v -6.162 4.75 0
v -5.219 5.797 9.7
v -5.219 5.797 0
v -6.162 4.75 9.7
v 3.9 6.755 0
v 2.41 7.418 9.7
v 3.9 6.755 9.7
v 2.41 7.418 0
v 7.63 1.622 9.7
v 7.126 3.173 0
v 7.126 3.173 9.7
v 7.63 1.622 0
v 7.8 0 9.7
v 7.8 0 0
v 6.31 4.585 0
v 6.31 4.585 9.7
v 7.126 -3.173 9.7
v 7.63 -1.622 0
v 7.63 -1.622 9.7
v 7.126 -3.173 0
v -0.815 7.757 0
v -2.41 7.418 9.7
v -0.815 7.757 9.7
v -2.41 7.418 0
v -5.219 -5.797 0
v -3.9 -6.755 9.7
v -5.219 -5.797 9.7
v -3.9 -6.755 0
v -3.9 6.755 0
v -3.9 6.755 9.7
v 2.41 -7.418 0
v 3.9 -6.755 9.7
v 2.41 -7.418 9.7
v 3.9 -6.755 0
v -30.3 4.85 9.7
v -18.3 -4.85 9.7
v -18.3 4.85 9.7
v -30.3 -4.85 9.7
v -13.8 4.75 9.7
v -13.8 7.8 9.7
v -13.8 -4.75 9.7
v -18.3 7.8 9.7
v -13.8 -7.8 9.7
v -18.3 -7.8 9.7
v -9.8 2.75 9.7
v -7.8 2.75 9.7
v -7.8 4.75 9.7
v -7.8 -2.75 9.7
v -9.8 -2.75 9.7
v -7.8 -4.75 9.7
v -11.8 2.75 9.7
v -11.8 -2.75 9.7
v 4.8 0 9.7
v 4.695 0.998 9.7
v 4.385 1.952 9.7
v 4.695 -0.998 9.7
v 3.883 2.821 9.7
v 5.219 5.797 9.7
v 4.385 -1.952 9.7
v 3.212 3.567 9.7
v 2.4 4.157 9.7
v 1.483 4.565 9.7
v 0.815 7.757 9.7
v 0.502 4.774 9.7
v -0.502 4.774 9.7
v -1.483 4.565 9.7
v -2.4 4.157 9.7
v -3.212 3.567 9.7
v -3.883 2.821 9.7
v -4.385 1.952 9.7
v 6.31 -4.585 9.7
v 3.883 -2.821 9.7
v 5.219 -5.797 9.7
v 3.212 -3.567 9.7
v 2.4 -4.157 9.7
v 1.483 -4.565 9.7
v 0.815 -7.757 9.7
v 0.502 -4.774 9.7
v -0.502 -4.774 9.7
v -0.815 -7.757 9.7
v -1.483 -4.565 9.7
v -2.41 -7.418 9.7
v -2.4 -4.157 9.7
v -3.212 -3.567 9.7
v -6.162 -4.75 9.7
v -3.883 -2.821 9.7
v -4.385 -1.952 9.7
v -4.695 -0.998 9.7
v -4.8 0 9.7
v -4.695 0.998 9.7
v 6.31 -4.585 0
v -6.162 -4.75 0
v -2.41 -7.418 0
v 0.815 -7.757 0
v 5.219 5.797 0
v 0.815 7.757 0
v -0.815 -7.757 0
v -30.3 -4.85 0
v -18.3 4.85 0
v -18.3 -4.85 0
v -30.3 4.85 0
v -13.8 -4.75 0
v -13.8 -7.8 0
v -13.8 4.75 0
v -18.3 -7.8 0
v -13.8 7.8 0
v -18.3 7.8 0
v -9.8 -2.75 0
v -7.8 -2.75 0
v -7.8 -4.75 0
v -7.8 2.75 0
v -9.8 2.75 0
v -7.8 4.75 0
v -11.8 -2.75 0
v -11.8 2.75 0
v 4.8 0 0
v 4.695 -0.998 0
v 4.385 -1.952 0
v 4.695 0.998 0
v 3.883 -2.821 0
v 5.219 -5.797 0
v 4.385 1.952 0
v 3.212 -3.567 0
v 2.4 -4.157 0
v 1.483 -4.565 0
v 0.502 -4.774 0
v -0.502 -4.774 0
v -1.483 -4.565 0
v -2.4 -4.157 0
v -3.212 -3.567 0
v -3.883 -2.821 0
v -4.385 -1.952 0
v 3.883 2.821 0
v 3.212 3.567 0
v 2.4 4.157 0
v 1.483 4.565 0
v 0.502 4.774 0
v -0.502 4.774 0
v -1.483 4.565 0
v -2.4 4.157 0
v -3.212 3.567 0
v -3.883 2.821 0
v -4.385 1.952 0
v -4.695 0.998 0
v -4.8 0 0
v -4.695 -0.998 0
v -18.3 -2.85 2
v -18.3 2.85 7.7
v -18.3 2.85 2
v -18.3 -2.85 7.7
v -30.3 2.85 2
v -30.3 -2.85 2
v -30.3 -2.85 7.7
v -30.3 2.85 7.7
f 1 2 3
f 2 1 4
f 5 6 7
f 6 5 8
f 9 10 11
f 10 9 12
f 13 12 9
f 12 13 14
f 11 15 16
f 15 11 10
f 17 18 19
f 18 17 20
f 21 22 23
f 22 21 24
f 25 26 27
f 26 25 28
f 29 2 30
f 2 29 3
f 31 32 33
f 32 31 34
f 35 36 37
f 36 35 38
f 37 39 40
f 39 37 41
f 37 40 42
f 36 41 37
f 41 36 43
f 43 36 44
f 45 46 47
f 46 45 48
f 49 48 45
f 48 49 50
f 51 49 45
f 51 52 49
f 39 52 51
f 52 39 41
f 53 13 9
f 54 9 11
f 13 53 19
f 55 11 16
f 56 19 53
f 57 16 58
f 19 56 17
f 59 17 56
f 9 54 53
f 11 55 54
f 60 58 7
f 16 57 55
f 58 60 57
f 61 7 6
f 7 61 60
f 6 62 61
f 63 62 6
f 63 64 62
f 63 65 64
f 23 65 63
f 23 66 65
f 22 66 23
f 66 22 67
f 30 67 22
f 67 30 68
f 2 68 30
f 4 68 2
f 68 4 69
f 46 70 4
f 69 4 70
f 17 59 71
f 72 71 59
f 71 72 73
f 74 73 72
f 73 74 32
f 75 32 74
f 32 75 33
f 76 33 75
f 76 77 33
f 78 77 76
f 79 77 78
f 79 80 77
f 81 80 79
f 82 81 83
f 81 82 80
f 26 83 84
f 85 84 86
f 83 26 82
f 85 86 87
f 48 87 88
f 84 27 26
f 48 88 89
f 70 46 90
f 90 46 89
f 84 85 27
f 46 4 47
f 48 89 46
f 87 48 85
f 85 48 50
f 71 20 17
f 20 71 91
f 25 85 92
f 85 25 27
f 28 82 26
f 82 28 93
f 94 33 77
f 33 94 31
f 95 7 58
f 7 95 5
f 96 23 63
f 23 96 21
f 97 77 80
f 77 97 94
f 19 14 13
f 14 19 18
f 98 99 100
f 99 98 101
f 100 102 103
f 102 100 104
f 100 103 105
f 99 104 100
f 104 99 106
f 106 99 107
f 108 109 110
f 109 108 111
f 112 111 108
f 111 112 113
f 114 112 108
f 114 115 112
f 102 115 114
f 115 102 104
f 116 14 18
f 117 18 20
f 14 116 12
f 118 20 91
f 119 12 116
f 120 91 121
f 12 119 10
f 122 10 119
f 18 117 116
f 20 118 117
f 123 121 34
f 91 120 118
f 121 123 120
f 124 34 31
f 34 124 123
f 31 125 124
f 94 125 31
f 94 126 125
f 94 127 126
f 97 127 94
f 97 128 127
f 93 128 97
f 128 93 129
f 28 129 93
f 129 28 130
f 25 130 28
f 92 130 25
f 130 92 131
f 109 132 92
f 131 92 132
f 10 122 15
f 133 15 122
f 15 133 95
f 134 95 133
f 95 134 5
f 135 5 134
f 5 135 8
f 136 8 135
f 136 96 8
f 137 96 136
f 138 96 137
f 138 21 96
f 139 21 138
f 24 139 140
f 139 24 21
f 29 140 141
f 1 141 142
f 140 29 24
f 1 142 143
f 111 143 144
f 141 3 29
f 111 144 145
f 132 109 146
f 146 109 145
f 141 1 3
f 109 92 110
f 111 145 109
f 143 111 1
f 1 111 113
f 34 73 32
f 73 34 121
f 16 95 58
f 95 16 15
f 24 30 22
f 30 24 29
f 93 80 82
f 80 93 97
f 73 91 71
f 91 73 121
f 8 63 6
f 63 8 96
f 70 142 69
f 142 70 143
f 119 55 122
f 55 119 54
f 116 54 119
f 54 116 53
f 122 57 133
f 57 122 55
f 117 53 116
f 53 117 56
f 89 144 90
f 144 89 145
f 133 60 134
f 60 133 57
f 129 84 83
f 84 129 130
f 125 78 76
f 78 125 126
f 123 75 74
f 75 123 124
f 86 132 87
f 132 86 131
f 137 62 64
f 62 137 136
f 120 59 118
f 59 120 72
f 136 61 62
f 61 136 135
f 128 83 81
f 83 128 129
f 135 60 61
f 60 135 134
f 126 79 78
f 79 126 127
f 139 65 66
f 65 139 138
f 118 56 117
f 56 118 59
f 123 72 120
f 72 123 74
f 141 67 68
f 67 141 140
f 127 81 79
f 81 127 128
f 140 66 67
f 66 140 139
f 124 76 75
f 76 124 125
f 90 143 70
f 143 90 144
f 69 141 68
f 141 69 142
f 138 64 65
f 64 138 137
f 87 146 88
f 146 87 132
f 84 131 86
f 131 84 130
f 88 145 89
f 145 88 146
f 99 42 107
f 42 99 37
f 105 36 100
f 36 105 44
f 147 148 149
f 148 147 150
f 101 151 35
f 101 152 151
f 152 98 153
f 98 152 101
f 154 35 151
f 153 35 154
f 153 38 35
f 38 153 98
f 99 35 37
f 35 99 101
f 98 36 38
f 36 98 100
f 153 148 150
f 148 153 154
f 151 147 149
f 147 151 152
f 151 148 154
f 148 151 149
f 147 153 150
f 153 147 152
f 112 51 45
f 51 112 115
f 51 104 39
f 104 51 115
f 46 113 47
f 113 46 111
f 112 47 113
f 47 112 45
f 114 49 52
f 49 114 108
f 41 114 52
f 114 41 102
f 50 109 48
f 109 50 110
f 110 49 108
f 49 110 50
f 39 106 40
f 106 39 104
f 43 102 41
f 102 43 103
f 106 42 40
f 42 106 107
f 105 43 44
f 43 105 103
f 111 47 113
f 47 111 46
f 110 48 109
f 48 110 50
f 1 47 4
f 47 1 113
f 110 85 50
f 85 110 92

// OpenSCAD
// -----------------------------------------------------------
// Customizable Socket Organizers: Dowel (Round Cross Section)
// -----------------------------------------------------------
//
// Zemba Craftworks
// youtube.com/zembacraftworks
// thingiverse.com/zembacraftworks/about

// This is a configurable, 3D printable insert designed to
// slide onto a metal or wooden bar to create socket set
// organizers. Dimensions can be adjusted for sockets of
// all sizes and to slide onto bars/holders of any size.

// Date Created:  2018-07-30
// Last Modified: 2018-12-19

// Critical Dimensions
// -------------------
// Adjust these dimensions and verify them with a test print
// before printing holders for all of your sockets! You want a
// snug fit but not so tight that anything gets stuck. These
// values will vary depending on your sockets, the rail you're
// using, and the calibration of your printer.

d  = 9.7;           // Socket Drive Width (mm)
                    // (9.7 = approximately 3/8 in * 25.4 mm/in)
                    
dh = 12;            // Socket Drive Height (mm)
                    // May or may not be limited by the design
                    // of your sockets
                    
rr = 4.8;             // Dowel Radius (mm)
                    // (4.8 = approximately 3/8 in * 25.4 mm/in / 2)

fn1 = 30;           // Number of Facets for Nub Curvature 


// Other Dimensions 
// ----------------
// These dimensions are not as critical to the fit, but can be
// adjusted to suit your preferences.

dw = 2;             // Drive Wall Thickness (mm)
                    // Set to d/2 to make the drive post solid
ds = 5.5;           // Drive Stand Width (mm)
                    // (region between clamp and flange)
ct = 3;             // Wall Thickness of Rail Clamp (mm)
ch = d;             // Height of Rail Clamp (mm)
                    // (generally ch = d)                  
cg = 0;             // Bottom Gap of Rail Clamp (mm)
                    // (adds some flex when attaching to rail)
fa = 6;             // Flange Height above Rail Clamp (mm)
fc = 2;             // Flange Chamfer Width (mm)
fw = 2*rr+2*ct;     // Flange Width (mm)
                    // (fw = ry+2*ct = flush with clamp)
ft = 1.5*ct;        // Flange Thickness (mm)

// Nub Dimensions (Optional)
// ------------------
// This imitates the spring-loaded bearing on the socket wrench which
// mates to the internal notch or side hole of the socket. However,
// you may have better success without it. Depending on your print
// it may snap off or deform easily when inserting into the socket.

enableNub = false;  // Enable Nub for Socket
nw = 3;             // Nub Width (mm)
nt = 0.5;           // Nub Height (mm)
nh = 5.5;           // Nub Distance from Flange (mm)
nr = 0.49;          // Radius of Curved Nub Edge (must be <= nt)

// Tolerance Value
// ---------------
// When shapes are subtracted through difference() in
// OpenSCAD, there is ambiguity if any faces of the two shapes
// occupy the same space. Adding a small value 't' to make
// the subtracted shape slightly larger prevents this.

t = 0.1;

// Create Socket Organizer:
union(){

    // Dowel Clamp
    difference(){ 
        cylinder(r=rr+ct,h=d,$fn=fn1);
        translate([0,0,-t/2])
        cylinder(r=rr,h=d+t,$fn=fn1);
        // Dowel Clamp Gap
        translate([0, -cg/2, 0]){
            cube([rr+ct, cg, ch]);}}

    // Socket Drive
    difference(){    
        // Socket Drive Exterior
        translate([-dh-rr-ct-fa-ft,-d/2,0]){
            cube([dh,d,d]);}
        // Socket Drive Interior
        translate([-dh-rr-ct-fa-ft-t/2,-(d-2*dw)/2,dw]){
            cube([dh+t,d-2*dw,d-2*dw]);}}

    // Socket Drive Flange
    translate([-ft-rr-ct-fa,-fw/2,0]){
        cube([ft,fw,d]);    }

    // Socket Drive Support
    translate([-rr-ct/2-fa-ct/2,-ds/2,0]){
        cube([fa+ct/2,ds,d]);}

    // Create Nub (Optional)
    // (+0.0001 ensures cube is not height 0 when nt = nr)
    if (enableNub){
        translate([nr-nw-rr-ct-fa-ft-nh,nr-nw/2,nr-nt+d]){
            difference(){
                minkowski(){
                    sphere(r=nr,$fn=fn1);
                    cube([nw-2*nr,nw-2*nr,2*nt-2*nr+0.0001]);}
                translate([-nr,-nr,-nr]){
                    cube([nw,nw,nt]);}}}}

    // Chamfers
    translate([-rr-ct-fa,ds/2,0]){
        chamfer(fc,d,t);}
    translate([-rr-ct,ds/2,0]){
        rotate([0,0,90]){    
            chamfer(fc,d,t);}}
    translate([-rr-ct-fa,-ds/2,0]){
        rotate([0,0,-90]){    
            chamfer(fc,d,t);}}
    translate([-rr-ct,-ds/2,0]){
        rotate([0,0,-180]){    
            chamfer(fc,d,t);}}
    translate([-ct-rr,-ds/2-fc,0]){
        cube([ct,ds+2*fc,d]);}
}

// Chamfer Module
// Creates an interior chamfered edge w x w x h
module chamfer(w,h,t){
    hyp = sqrt(pow(w,2)+pow(w,2)); // Hypotenuse Distance
    difference(){
    cube([w,w,h]);
    translate([w,0,-t/2]){
        rotate([0,0,45]){
            cube([hyp,hyp,h+t]);}}}}
